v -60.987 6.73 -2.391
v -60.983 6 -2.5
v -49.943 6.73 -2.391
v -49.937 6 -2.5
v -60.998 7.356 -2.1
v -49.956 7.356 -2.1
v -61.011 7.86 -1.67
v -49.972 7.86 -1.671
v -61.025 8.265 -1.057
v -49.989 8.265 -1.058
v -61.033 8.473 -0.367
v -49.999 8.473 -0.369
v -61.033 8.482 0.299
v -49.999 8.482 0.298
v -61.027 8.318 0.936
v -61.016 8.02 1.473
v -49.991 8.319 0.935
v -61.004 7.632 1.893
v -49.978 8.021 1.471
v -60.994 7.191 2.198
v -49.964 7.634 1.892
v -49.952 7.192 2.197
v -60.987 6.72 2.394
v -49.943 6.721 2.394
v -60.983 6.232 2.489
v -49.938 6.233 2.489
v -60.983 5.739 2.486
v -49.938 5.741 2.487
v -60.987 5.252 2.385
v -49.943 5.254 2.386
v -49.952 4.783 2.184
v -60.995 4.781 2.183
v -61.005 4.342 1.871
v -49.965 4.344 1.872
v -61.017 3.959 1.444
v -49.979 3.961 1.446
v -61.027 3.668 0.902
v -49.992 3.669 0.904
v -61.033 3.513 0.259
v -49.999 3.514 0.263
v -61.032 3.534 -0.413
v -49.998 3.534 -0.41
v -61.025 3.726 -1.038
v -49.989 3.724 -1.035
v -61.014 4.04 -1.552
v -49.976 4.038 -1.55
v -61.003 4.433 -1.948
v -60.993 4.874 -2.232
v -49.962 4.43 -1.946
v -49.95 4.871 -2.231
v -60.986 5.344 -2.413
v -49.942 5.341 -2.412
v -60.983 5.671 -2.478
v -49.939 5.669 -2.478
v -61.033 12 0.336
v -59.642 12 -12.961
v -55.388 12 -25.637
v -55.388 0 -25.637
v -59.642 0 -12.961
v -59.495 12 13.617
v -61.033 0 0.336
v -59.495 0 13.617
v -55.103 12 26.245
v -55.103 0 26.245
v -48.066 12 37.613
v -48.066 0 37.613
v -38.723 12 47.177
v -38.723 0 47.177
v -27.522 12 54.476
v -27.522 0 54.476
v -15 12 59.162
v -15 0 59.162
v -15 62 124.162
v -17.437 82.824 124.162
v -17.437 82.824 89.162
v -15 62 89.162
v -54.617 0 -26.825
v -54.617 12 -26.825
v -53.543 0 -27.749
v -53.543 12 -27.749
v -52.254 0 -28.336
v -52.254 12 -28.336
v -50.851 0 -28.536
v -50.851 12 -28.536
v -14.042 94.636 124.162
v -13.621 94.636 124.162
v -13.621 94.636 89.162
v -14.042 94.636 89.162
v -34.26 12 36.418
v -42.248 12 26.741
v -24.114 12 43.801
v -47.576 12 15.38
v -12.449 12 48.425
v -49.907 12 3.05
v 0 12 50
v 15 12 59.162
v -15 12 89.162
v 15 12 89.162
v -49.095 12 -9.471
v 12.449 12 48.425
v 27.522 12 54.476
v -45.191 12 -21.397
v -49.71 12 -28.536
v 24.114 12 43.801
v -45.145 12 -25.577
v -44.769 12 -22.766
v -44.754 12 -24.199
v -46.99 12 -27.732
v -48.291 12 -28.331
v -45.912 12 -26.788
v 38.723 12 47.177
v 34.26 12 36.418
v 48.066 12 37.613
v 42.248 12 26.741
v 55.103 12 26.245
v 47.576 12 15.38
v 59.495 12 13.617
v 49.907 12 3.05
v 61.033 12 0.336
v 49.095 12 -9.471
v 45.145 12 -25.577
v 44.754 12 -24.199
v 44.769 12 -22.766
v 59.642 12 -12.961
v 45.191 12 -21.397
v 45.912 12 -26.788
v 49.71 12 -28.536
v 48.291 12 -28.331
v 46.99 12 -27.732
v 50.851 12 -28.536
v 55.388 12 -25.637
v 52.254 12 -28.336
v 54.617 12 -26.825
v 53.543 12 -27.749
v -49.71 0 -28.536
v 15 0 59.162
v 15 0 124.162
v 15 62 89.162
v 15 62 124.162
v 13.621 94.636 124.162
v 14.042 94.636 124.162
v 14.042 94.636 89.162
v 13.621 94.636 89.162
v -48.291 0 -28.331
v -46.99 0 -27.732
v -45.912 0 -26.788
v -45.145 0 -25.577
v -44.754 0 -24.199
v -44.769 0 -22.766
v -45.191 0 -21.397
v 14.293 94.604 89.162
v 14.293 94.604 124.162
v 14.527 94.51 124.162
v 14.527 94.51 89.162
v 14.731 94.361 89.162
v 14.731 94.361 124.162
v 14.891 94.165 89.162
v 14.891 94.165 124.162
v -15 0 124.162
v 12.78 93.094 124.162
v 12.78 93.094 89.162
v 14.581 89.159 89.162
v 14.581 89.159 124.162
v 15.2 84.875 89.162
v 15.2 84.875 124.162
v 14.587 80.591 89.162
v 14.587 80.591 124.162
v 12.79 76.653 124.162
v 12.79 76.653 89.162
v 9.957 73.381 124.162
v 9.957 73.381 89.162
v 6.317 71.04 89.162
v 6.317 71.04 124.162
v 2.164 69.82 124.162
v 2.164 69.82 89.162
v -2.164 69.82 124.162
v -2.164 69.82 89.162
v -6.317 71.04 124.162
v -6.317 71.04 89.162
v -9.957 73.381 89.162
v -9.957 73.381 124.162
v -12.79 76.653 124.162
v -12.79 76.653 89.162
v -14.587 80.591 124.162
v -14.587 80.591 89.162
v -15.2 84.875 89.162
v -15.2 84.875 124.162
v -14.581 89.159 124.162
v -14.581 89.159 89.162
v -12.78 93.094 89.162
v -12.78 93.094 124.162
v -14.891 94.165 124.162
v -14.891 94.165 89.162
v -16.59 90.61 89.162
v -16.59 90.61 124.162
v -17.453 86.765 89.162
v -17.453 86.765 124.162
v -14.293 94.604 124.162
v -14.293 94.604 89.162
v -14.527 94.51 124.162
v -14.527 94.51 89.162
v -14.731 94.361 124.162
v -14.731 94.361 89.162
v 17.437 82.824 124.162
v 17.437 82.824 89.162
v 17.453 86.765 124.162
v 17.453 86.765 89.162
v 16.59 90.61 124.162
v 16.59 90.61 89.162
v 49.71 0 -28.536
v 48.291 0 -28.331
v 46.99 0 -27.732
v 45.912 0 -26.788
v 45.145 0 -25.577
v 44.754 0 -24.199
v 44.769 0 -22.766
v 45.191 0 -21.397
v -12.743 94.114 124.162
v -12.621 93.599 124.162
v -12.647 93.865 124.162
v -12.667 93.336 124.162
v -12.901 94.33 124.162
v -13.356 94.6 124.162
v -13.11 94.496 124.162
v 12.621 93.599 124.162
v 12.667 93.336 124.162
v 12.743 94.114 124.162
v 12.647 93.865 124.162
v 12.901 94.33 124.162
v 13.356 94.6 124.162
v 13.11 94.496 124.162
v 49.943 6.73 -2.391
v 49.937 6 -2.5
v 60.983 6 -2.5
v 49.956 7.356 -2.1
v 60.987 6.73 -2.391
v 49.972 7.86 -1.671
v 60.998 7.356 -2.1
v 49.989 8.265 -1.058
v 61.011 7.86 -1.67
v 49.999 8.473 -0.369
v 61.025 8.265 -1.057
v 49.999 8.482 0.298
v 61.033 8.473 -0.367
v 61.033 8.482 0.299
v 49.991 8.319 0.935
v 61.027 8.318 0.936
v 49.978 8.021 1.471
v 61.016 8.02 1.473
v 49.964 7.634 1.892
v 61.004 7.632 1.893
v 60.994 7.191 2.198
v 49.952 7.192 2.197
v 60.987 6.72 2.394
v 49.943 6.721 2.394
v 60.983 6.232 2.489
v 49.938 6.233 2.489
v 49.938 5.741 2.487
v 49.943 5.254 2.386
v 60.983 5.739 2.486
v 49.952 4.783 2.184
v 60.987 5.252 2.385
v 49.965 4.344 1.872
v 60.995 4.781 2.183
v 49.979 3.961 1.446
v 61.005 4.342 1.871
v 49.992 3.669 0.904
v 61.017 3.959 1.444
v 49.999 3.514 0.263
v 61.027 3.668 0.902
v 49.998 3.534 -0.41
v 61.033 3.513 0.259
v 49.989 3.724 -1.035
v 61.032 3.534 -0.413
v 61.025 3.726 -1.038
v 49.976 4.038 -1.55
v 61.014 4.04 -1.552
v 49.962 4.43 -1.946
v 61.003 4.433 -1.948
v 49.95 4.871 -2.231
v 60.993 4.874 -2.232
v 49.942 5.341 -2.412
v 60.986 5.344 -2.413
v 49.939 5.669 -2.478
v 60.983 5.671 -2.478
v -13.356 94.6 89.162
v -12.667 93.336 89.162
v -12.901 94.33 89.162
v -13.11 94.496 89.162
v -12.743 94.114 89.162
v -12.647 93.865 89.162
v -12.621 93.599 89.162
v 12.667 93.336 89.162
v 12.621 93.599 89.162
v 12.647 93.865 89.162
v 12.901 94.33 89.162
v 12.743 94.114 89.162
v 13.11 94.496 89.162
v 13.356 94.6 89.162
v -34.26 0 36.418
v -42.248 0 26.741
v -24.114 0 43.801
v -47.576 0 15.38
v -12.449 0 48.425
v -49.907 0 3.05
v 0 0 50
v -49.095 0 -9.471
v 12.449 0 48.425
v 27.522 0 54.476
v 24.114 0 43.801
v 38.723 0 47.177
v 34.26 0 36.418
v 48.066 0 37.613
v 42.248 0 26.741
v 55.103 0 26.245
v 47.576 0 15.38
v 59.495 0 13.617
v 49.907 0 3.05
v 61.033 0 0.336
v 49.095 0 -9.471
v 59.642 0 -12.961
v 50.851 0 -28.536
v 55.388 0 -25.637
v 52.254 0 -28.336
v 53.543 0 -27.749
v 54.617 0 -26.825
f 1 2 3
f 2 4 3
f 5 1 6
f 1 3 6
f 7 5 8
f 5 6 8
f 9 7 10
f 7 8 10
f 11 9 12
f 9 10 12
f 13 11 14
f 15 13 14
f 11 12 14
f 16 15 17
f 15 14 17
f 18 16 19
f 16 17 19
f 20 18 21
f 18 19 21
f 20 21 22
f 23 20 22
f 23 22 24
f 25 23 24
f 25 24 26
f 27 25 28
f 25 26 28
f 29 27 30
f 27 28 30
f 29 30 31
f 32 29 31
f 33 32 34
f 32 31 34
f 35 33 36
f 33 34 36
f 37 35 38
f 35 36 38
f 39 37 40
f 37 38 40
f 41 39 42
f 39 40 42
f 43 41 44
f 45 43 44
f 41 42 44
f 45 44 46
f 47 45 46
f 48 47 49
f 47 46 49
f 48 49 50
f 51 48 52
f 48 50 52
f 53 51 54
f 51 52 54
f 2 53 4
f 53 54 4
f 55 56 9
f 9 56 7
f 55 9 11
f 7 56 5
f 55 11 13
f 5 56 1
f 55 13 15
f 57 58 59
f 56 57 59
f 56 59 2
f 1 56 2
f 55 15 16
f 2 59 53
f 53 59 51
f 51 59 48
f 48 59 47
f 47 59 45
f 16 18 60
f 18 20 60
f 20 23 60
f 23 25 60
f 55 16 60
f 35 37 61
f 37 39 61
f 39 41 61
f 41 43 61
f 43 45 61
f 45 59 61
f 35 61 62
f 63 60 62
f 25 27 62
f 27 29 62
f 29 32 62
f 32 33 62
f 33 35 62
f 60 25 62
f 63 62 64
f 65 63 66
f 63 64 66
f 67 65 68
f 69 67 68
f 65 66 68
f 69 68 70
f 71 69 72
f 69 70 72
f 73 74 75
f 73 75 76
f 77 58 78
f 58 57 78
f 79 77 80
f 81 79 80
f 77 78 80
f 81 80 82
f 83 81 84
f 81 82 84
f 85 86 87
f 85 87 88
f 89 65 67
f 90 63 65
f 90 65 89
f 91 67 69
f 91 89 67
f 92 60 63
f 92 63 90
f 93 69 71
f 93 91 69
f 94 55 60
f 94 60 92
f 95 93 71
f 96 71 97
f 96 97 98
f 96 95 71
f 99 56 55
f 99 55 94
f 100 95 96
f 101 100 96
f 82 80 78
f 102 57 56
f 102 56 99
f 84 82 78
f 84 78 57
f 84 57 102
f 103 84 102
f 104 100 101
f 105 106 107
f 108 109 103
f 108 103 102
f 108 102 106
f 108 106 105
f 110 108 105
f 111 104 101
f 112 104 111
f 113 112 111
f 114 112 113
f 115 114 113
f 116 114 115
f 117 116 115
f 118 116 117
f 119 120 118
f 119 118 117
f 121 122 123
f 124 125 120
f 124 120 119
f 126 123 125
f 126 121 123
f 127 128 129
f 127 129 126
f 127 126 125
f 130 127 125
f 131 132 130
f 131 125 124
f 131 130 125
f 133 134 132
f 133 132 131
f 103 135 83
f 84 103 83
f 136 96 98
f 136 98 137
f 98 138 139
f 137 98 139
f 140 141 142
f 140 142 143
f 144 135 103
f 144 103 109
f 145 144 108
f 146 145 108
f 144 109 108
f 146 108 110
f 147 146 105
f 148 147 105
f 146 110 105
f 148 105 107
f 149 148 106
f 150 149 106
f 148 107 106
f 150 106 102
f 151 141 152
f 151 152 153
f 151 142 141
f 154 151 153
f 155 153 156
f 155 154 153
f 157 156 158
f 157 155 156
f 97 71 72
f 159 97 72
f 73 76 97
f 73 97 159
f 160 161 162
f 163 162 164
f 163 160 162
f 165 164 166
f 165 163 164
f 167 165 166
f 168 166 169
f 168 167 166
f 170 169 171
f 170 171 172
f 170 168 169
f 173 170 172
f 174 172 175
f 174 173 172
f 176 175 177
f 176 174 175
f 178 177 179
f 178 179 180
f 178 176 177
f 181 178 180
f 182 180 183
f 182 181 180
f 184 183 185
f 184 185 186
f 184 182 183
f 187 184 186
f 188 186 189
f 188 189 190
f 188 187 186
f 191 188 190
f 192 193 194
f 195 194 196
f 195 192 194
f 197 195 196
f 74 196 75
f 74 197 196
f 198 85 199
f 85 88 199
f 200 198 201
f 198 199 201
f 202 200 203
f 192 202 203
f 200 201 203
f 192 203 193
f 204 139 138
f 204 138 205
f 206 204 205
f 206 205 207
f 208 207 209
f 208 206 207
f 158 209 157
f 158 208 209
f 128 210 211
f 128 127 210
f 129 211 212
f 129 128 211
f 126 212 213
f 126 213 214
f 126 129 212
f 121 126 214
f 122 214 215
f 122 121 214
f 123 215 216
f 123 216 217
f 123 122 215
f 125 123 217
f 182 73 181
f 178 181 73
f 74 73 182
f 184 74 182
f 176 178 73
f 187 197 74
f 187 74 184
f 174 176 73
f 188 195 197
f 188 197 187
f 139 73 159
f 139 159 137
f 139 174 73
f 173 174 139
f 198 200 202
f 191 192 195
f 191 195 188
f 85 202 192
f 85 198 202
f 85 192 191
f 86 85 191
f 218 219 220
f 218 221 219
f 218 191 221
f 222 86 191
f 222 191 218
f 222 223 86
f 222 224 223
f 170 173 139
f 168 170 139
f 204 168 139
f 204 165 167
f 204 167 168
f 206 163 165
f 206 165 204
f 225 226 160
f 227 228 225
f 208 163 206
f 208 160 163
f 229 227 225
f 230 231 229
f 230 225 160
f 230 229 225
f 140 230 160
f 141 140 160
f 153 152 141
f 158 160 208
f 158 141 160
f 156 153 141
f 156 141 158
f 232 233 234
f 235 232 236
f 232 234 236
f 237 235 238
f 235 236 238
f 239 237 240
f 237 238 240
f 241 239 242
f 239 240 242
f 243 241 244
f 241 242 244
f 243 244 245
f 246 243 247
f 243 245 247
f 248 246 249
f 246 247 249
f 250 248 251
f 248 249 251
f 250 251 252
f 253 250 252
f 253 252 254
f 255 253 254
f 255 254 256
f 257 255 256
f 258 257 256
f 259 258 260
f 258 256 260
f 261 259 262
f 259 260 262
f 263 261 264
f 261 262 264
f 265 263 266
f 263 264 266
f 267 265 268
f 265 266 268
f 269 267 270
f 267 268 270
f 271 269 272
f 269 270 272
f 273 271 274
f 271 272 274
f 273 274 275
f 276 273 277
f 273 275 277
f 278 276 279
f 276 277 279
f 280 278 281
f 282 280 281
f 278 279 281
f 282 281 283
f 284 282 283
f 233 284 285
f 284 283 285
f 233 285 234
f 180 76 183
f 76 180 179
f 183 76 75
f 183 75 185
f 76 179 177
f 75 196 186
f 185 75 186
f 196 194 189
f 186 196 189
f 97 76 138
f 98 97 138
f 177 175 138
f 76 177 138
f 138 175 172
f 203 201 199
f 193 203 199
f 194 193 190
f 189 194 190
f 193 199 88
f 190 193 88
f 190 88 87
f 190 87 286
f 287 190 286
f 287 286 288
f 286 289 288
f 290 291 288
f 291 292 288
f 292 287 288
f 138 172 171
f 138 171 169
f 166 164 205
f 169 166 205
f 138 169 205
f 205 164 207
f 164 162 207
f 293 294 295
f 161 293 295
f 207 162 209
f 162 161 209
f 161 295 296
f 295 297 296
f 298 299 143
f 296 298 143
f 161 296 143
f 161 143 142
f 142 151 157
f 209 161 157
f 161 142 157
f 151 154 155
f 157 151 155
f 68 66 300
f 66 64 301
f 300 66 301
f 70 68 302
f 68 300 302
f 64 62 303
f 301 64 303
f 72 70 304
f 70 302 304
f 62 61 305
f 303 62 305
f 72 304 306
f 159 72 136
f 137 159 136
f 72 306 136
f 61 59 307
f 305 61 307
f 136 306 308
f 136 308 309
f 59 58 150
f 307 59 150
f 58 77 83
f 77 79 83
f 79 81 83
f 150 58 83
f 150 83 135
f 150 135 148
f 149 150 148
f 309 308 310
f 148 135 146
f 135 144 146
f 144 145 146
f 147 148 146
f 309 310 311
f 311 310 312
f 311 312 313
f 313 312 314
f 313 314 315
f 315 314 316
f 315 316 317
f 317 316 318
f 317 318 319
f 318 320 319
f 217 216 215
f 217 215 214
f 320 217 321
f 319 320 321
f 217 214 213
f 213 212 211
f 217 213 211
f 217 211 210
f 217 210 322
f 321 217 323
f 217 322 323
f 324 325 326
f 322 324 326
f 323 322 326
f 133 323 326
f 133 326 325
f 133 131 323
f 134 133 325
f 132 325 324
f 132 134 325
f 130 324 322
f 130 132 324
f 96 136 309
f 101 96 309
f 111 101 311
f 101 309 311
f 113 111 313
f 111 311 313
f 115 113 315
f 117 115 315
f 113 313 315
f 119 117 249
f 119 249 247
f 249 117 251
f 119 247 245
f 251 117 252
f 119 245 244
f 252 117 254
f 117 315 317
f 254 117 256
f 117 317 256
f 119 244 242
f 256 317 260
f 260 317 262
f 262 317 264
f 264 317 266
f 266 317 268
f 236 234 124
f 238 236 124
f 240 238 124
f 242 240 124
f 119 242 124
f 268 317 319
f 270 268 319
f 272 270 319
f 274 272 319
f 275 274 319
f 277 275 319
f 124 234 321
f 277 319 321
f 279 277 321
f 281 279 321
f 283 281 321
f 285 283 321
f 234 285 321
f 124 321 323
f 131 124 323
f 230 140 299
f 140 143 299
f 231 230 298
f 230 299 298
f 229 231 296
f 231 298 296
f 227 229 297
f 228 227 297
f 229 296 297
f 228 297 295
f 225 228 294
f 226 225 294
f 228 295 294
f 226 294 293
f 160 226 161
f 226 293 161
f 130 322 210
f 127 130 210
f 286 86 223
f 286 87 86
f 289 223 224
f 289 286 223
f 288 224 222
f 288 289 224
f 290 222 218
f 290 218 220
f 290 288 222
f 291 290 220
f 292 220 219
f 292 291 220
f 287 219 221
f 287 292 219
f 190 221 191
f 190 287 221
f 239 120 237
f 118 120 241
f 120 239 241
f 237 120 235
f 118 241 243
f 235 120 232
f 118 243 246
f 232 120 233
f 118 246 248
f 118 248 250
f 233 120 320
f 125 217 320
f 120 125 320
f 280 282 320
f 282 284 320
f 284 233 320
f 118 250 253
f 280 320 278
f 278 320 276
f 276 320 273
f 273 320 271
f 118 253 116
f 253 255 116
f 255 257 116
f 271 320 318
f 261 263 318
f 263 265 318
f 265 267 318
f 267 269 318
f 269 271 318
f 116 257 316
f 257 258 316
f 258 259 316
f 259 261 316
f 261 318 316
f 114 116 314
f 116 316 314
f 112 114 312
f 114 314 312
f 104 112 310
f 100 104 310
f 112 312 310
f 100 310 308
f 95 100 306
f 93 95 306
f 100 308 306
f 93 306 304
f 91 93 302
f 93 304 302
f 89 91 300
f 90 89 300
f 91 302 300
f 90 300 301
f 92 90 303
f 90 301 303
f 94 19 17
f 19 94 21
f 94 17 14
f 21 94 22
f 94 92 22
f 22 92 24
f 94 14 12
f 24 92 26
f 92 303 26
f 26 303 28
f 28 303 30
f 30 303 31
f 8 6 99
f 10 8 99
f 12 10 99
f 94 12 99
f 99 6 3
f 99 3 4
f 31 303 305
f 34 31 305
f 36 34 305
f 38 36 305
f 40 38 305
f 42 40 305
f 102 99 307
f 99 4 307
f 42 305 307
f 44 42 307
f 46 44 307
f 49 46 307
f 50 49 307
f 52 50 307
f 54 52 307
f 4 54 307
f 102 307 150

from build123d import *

# Parameters (mm, degrees)
BOSS_EXTRUDE1_DEPTH = 12
SKETCH2_R           = 2.5
CUT_EXTRUDE1_DEPTH  = 500
SKETCH4_W           = 35
SKETCH4_H           = 50
BOSS_EXTRUDE2_DEPTH = 30
BOSS_EXTRUDE3_DEPTH = 35
FILLET1_R           = 5
FILLET2_R           = 1
FILLET_1_R          = 1


with BuildPart() as part:
    # Sketch1 → Boss-Extrude1 (new body)
    with BuildSketch(Plane(origin=(0, 0, 0), x_dir=(1, 0, 0), z_dir=(0, 1, 0))):
        with BuildLine():
            Line((-41.057019736, 28.536312488), (-53.951781887, 28.536312488))
            ThreePointArc((-53.951781887, 28.536312488), (-55.779259556, -24.774787639), (-15, -59.16177735))
            Line((-15, -59.16177735), (15, -59.16177735))
            ThreePointArc((15, -59.16177735), (55.779259556, -24.774787639), (53.951781887, 28.536312488))
            Line((53.951781887, 28.536312488), (41.057019736, 28.536312488))
            ThreePointArc((41.057019736, 28.536312488), (0, -50), (-41.057019736, 28.536312488))
        make_face()
        with BuildLine():
            ThreePointArc((15, -59.16177735), (0, -61.033727554), (-15, -59.16177735))
            Line((-15, -59.16177735), (-15, -124.16177735))
            Line((-15, -124.16177735), (15, -124.16177735))
            Line((15, -124.16177735), (15, -59.16177735))
        make_face()
        with BuildLine():
            Line((15, -59.16177735), (-15, -59.16177735))
            ThreePointArc((-15, -59.16177735), (0, -61.033727554), (15, -59.16177735))
        make_face()
    extrude(amount=BOSS_EXTRUDE1_DEPTH)

    # Sketch2 → Cut-Extrude1 (cut, symmetric)
    with BuildSketch(Plane(origin=(15, 0, 0), x_dir=(0, 0, -1), z_dir=(1, 0, 0))):
        with Locations((0, 6)):
            Circle(SKETCH2_R)
    extrude(amount=CUT_EXTRUDE1_DEPTH, both=True, mode=Mode.SUBTRACT)

    # Sketch4 → Boss-Extrude2 (add)
    with BuildSketch(Plane.ZY.offset(15)):
        with Locations((106.66177735, 37)):
            Rectangle(SKETCH4_W, SKETCH4_H)
    extrude(amount=-BOSS_EXTRUDE2_DEPTH)

    # Sketch5 → Boss-Extrude3 (add)
    with BuildSketch(Plane.XY.offset(124.16177735)):
        with BuildLine():
            Line((-11.643875535, 94.635635732), (-14.586391276, 94.635635732))
            ThreePointArc((-14.586391276, 94.635635732), (-17.06618452, 88.984526001), (-17.437258677, 82.824435117))
            Line((-17.437258677, 82.824435117), (-15, 62))
            Line((-15, 62), (15, 62))
            Line((15, 62), (17.437258677, 82.824435117))
            ThreePointArc((17.437258677, 82.824435117), (17.06618452, 88.984526001), (14.586391276, 94.635635732))
            Line((14.586391276, 94.635635732), (11.643875535, 94.635635732))
            ThreePointArc((11.643875535, 94.635635732), (0, 69.665264065), (-11.643875535, 94.635635732))
        make_face()
    extrude(amount=-BOSS_EXTRUDE3_DEPTH)

    # Fillet1
    fillet1_edges = [part.edges().sort_by_distance(p)[0] for p in [
        (-53.951781887, 6, -28.536312488),
        (-41.057019736, 6, -28.536312488),
        (41.057019736, 6, -28.536312488),
        (53.951781887, 6, -28.536312488),
    ]]
    fillet(fillet1_edges, radius=FILLET1_R)

    # Fillet2
    fillet2_edges = [part.edges().sort_by_distance(p)[0] for p in [
        (11.643875535, 94.635635732, 106.66177735),
        (-11.643875535, 94.635635732, 106.66177735),
    ]]
    fillet(fillet2_edges, radius=FILLET2_R)

    # 圆角1
    fillet_1_edges = [part.edges().sort_by_distance(p)[0] for p in [
        (14.586391276, 94.635635732, 106.66177735),
        (-14.586391276, 94.635635732, 106.66177735),
    ]]
    fillet(fillet_1_edges, radius=FILLET_1_R)


solid = part.part
